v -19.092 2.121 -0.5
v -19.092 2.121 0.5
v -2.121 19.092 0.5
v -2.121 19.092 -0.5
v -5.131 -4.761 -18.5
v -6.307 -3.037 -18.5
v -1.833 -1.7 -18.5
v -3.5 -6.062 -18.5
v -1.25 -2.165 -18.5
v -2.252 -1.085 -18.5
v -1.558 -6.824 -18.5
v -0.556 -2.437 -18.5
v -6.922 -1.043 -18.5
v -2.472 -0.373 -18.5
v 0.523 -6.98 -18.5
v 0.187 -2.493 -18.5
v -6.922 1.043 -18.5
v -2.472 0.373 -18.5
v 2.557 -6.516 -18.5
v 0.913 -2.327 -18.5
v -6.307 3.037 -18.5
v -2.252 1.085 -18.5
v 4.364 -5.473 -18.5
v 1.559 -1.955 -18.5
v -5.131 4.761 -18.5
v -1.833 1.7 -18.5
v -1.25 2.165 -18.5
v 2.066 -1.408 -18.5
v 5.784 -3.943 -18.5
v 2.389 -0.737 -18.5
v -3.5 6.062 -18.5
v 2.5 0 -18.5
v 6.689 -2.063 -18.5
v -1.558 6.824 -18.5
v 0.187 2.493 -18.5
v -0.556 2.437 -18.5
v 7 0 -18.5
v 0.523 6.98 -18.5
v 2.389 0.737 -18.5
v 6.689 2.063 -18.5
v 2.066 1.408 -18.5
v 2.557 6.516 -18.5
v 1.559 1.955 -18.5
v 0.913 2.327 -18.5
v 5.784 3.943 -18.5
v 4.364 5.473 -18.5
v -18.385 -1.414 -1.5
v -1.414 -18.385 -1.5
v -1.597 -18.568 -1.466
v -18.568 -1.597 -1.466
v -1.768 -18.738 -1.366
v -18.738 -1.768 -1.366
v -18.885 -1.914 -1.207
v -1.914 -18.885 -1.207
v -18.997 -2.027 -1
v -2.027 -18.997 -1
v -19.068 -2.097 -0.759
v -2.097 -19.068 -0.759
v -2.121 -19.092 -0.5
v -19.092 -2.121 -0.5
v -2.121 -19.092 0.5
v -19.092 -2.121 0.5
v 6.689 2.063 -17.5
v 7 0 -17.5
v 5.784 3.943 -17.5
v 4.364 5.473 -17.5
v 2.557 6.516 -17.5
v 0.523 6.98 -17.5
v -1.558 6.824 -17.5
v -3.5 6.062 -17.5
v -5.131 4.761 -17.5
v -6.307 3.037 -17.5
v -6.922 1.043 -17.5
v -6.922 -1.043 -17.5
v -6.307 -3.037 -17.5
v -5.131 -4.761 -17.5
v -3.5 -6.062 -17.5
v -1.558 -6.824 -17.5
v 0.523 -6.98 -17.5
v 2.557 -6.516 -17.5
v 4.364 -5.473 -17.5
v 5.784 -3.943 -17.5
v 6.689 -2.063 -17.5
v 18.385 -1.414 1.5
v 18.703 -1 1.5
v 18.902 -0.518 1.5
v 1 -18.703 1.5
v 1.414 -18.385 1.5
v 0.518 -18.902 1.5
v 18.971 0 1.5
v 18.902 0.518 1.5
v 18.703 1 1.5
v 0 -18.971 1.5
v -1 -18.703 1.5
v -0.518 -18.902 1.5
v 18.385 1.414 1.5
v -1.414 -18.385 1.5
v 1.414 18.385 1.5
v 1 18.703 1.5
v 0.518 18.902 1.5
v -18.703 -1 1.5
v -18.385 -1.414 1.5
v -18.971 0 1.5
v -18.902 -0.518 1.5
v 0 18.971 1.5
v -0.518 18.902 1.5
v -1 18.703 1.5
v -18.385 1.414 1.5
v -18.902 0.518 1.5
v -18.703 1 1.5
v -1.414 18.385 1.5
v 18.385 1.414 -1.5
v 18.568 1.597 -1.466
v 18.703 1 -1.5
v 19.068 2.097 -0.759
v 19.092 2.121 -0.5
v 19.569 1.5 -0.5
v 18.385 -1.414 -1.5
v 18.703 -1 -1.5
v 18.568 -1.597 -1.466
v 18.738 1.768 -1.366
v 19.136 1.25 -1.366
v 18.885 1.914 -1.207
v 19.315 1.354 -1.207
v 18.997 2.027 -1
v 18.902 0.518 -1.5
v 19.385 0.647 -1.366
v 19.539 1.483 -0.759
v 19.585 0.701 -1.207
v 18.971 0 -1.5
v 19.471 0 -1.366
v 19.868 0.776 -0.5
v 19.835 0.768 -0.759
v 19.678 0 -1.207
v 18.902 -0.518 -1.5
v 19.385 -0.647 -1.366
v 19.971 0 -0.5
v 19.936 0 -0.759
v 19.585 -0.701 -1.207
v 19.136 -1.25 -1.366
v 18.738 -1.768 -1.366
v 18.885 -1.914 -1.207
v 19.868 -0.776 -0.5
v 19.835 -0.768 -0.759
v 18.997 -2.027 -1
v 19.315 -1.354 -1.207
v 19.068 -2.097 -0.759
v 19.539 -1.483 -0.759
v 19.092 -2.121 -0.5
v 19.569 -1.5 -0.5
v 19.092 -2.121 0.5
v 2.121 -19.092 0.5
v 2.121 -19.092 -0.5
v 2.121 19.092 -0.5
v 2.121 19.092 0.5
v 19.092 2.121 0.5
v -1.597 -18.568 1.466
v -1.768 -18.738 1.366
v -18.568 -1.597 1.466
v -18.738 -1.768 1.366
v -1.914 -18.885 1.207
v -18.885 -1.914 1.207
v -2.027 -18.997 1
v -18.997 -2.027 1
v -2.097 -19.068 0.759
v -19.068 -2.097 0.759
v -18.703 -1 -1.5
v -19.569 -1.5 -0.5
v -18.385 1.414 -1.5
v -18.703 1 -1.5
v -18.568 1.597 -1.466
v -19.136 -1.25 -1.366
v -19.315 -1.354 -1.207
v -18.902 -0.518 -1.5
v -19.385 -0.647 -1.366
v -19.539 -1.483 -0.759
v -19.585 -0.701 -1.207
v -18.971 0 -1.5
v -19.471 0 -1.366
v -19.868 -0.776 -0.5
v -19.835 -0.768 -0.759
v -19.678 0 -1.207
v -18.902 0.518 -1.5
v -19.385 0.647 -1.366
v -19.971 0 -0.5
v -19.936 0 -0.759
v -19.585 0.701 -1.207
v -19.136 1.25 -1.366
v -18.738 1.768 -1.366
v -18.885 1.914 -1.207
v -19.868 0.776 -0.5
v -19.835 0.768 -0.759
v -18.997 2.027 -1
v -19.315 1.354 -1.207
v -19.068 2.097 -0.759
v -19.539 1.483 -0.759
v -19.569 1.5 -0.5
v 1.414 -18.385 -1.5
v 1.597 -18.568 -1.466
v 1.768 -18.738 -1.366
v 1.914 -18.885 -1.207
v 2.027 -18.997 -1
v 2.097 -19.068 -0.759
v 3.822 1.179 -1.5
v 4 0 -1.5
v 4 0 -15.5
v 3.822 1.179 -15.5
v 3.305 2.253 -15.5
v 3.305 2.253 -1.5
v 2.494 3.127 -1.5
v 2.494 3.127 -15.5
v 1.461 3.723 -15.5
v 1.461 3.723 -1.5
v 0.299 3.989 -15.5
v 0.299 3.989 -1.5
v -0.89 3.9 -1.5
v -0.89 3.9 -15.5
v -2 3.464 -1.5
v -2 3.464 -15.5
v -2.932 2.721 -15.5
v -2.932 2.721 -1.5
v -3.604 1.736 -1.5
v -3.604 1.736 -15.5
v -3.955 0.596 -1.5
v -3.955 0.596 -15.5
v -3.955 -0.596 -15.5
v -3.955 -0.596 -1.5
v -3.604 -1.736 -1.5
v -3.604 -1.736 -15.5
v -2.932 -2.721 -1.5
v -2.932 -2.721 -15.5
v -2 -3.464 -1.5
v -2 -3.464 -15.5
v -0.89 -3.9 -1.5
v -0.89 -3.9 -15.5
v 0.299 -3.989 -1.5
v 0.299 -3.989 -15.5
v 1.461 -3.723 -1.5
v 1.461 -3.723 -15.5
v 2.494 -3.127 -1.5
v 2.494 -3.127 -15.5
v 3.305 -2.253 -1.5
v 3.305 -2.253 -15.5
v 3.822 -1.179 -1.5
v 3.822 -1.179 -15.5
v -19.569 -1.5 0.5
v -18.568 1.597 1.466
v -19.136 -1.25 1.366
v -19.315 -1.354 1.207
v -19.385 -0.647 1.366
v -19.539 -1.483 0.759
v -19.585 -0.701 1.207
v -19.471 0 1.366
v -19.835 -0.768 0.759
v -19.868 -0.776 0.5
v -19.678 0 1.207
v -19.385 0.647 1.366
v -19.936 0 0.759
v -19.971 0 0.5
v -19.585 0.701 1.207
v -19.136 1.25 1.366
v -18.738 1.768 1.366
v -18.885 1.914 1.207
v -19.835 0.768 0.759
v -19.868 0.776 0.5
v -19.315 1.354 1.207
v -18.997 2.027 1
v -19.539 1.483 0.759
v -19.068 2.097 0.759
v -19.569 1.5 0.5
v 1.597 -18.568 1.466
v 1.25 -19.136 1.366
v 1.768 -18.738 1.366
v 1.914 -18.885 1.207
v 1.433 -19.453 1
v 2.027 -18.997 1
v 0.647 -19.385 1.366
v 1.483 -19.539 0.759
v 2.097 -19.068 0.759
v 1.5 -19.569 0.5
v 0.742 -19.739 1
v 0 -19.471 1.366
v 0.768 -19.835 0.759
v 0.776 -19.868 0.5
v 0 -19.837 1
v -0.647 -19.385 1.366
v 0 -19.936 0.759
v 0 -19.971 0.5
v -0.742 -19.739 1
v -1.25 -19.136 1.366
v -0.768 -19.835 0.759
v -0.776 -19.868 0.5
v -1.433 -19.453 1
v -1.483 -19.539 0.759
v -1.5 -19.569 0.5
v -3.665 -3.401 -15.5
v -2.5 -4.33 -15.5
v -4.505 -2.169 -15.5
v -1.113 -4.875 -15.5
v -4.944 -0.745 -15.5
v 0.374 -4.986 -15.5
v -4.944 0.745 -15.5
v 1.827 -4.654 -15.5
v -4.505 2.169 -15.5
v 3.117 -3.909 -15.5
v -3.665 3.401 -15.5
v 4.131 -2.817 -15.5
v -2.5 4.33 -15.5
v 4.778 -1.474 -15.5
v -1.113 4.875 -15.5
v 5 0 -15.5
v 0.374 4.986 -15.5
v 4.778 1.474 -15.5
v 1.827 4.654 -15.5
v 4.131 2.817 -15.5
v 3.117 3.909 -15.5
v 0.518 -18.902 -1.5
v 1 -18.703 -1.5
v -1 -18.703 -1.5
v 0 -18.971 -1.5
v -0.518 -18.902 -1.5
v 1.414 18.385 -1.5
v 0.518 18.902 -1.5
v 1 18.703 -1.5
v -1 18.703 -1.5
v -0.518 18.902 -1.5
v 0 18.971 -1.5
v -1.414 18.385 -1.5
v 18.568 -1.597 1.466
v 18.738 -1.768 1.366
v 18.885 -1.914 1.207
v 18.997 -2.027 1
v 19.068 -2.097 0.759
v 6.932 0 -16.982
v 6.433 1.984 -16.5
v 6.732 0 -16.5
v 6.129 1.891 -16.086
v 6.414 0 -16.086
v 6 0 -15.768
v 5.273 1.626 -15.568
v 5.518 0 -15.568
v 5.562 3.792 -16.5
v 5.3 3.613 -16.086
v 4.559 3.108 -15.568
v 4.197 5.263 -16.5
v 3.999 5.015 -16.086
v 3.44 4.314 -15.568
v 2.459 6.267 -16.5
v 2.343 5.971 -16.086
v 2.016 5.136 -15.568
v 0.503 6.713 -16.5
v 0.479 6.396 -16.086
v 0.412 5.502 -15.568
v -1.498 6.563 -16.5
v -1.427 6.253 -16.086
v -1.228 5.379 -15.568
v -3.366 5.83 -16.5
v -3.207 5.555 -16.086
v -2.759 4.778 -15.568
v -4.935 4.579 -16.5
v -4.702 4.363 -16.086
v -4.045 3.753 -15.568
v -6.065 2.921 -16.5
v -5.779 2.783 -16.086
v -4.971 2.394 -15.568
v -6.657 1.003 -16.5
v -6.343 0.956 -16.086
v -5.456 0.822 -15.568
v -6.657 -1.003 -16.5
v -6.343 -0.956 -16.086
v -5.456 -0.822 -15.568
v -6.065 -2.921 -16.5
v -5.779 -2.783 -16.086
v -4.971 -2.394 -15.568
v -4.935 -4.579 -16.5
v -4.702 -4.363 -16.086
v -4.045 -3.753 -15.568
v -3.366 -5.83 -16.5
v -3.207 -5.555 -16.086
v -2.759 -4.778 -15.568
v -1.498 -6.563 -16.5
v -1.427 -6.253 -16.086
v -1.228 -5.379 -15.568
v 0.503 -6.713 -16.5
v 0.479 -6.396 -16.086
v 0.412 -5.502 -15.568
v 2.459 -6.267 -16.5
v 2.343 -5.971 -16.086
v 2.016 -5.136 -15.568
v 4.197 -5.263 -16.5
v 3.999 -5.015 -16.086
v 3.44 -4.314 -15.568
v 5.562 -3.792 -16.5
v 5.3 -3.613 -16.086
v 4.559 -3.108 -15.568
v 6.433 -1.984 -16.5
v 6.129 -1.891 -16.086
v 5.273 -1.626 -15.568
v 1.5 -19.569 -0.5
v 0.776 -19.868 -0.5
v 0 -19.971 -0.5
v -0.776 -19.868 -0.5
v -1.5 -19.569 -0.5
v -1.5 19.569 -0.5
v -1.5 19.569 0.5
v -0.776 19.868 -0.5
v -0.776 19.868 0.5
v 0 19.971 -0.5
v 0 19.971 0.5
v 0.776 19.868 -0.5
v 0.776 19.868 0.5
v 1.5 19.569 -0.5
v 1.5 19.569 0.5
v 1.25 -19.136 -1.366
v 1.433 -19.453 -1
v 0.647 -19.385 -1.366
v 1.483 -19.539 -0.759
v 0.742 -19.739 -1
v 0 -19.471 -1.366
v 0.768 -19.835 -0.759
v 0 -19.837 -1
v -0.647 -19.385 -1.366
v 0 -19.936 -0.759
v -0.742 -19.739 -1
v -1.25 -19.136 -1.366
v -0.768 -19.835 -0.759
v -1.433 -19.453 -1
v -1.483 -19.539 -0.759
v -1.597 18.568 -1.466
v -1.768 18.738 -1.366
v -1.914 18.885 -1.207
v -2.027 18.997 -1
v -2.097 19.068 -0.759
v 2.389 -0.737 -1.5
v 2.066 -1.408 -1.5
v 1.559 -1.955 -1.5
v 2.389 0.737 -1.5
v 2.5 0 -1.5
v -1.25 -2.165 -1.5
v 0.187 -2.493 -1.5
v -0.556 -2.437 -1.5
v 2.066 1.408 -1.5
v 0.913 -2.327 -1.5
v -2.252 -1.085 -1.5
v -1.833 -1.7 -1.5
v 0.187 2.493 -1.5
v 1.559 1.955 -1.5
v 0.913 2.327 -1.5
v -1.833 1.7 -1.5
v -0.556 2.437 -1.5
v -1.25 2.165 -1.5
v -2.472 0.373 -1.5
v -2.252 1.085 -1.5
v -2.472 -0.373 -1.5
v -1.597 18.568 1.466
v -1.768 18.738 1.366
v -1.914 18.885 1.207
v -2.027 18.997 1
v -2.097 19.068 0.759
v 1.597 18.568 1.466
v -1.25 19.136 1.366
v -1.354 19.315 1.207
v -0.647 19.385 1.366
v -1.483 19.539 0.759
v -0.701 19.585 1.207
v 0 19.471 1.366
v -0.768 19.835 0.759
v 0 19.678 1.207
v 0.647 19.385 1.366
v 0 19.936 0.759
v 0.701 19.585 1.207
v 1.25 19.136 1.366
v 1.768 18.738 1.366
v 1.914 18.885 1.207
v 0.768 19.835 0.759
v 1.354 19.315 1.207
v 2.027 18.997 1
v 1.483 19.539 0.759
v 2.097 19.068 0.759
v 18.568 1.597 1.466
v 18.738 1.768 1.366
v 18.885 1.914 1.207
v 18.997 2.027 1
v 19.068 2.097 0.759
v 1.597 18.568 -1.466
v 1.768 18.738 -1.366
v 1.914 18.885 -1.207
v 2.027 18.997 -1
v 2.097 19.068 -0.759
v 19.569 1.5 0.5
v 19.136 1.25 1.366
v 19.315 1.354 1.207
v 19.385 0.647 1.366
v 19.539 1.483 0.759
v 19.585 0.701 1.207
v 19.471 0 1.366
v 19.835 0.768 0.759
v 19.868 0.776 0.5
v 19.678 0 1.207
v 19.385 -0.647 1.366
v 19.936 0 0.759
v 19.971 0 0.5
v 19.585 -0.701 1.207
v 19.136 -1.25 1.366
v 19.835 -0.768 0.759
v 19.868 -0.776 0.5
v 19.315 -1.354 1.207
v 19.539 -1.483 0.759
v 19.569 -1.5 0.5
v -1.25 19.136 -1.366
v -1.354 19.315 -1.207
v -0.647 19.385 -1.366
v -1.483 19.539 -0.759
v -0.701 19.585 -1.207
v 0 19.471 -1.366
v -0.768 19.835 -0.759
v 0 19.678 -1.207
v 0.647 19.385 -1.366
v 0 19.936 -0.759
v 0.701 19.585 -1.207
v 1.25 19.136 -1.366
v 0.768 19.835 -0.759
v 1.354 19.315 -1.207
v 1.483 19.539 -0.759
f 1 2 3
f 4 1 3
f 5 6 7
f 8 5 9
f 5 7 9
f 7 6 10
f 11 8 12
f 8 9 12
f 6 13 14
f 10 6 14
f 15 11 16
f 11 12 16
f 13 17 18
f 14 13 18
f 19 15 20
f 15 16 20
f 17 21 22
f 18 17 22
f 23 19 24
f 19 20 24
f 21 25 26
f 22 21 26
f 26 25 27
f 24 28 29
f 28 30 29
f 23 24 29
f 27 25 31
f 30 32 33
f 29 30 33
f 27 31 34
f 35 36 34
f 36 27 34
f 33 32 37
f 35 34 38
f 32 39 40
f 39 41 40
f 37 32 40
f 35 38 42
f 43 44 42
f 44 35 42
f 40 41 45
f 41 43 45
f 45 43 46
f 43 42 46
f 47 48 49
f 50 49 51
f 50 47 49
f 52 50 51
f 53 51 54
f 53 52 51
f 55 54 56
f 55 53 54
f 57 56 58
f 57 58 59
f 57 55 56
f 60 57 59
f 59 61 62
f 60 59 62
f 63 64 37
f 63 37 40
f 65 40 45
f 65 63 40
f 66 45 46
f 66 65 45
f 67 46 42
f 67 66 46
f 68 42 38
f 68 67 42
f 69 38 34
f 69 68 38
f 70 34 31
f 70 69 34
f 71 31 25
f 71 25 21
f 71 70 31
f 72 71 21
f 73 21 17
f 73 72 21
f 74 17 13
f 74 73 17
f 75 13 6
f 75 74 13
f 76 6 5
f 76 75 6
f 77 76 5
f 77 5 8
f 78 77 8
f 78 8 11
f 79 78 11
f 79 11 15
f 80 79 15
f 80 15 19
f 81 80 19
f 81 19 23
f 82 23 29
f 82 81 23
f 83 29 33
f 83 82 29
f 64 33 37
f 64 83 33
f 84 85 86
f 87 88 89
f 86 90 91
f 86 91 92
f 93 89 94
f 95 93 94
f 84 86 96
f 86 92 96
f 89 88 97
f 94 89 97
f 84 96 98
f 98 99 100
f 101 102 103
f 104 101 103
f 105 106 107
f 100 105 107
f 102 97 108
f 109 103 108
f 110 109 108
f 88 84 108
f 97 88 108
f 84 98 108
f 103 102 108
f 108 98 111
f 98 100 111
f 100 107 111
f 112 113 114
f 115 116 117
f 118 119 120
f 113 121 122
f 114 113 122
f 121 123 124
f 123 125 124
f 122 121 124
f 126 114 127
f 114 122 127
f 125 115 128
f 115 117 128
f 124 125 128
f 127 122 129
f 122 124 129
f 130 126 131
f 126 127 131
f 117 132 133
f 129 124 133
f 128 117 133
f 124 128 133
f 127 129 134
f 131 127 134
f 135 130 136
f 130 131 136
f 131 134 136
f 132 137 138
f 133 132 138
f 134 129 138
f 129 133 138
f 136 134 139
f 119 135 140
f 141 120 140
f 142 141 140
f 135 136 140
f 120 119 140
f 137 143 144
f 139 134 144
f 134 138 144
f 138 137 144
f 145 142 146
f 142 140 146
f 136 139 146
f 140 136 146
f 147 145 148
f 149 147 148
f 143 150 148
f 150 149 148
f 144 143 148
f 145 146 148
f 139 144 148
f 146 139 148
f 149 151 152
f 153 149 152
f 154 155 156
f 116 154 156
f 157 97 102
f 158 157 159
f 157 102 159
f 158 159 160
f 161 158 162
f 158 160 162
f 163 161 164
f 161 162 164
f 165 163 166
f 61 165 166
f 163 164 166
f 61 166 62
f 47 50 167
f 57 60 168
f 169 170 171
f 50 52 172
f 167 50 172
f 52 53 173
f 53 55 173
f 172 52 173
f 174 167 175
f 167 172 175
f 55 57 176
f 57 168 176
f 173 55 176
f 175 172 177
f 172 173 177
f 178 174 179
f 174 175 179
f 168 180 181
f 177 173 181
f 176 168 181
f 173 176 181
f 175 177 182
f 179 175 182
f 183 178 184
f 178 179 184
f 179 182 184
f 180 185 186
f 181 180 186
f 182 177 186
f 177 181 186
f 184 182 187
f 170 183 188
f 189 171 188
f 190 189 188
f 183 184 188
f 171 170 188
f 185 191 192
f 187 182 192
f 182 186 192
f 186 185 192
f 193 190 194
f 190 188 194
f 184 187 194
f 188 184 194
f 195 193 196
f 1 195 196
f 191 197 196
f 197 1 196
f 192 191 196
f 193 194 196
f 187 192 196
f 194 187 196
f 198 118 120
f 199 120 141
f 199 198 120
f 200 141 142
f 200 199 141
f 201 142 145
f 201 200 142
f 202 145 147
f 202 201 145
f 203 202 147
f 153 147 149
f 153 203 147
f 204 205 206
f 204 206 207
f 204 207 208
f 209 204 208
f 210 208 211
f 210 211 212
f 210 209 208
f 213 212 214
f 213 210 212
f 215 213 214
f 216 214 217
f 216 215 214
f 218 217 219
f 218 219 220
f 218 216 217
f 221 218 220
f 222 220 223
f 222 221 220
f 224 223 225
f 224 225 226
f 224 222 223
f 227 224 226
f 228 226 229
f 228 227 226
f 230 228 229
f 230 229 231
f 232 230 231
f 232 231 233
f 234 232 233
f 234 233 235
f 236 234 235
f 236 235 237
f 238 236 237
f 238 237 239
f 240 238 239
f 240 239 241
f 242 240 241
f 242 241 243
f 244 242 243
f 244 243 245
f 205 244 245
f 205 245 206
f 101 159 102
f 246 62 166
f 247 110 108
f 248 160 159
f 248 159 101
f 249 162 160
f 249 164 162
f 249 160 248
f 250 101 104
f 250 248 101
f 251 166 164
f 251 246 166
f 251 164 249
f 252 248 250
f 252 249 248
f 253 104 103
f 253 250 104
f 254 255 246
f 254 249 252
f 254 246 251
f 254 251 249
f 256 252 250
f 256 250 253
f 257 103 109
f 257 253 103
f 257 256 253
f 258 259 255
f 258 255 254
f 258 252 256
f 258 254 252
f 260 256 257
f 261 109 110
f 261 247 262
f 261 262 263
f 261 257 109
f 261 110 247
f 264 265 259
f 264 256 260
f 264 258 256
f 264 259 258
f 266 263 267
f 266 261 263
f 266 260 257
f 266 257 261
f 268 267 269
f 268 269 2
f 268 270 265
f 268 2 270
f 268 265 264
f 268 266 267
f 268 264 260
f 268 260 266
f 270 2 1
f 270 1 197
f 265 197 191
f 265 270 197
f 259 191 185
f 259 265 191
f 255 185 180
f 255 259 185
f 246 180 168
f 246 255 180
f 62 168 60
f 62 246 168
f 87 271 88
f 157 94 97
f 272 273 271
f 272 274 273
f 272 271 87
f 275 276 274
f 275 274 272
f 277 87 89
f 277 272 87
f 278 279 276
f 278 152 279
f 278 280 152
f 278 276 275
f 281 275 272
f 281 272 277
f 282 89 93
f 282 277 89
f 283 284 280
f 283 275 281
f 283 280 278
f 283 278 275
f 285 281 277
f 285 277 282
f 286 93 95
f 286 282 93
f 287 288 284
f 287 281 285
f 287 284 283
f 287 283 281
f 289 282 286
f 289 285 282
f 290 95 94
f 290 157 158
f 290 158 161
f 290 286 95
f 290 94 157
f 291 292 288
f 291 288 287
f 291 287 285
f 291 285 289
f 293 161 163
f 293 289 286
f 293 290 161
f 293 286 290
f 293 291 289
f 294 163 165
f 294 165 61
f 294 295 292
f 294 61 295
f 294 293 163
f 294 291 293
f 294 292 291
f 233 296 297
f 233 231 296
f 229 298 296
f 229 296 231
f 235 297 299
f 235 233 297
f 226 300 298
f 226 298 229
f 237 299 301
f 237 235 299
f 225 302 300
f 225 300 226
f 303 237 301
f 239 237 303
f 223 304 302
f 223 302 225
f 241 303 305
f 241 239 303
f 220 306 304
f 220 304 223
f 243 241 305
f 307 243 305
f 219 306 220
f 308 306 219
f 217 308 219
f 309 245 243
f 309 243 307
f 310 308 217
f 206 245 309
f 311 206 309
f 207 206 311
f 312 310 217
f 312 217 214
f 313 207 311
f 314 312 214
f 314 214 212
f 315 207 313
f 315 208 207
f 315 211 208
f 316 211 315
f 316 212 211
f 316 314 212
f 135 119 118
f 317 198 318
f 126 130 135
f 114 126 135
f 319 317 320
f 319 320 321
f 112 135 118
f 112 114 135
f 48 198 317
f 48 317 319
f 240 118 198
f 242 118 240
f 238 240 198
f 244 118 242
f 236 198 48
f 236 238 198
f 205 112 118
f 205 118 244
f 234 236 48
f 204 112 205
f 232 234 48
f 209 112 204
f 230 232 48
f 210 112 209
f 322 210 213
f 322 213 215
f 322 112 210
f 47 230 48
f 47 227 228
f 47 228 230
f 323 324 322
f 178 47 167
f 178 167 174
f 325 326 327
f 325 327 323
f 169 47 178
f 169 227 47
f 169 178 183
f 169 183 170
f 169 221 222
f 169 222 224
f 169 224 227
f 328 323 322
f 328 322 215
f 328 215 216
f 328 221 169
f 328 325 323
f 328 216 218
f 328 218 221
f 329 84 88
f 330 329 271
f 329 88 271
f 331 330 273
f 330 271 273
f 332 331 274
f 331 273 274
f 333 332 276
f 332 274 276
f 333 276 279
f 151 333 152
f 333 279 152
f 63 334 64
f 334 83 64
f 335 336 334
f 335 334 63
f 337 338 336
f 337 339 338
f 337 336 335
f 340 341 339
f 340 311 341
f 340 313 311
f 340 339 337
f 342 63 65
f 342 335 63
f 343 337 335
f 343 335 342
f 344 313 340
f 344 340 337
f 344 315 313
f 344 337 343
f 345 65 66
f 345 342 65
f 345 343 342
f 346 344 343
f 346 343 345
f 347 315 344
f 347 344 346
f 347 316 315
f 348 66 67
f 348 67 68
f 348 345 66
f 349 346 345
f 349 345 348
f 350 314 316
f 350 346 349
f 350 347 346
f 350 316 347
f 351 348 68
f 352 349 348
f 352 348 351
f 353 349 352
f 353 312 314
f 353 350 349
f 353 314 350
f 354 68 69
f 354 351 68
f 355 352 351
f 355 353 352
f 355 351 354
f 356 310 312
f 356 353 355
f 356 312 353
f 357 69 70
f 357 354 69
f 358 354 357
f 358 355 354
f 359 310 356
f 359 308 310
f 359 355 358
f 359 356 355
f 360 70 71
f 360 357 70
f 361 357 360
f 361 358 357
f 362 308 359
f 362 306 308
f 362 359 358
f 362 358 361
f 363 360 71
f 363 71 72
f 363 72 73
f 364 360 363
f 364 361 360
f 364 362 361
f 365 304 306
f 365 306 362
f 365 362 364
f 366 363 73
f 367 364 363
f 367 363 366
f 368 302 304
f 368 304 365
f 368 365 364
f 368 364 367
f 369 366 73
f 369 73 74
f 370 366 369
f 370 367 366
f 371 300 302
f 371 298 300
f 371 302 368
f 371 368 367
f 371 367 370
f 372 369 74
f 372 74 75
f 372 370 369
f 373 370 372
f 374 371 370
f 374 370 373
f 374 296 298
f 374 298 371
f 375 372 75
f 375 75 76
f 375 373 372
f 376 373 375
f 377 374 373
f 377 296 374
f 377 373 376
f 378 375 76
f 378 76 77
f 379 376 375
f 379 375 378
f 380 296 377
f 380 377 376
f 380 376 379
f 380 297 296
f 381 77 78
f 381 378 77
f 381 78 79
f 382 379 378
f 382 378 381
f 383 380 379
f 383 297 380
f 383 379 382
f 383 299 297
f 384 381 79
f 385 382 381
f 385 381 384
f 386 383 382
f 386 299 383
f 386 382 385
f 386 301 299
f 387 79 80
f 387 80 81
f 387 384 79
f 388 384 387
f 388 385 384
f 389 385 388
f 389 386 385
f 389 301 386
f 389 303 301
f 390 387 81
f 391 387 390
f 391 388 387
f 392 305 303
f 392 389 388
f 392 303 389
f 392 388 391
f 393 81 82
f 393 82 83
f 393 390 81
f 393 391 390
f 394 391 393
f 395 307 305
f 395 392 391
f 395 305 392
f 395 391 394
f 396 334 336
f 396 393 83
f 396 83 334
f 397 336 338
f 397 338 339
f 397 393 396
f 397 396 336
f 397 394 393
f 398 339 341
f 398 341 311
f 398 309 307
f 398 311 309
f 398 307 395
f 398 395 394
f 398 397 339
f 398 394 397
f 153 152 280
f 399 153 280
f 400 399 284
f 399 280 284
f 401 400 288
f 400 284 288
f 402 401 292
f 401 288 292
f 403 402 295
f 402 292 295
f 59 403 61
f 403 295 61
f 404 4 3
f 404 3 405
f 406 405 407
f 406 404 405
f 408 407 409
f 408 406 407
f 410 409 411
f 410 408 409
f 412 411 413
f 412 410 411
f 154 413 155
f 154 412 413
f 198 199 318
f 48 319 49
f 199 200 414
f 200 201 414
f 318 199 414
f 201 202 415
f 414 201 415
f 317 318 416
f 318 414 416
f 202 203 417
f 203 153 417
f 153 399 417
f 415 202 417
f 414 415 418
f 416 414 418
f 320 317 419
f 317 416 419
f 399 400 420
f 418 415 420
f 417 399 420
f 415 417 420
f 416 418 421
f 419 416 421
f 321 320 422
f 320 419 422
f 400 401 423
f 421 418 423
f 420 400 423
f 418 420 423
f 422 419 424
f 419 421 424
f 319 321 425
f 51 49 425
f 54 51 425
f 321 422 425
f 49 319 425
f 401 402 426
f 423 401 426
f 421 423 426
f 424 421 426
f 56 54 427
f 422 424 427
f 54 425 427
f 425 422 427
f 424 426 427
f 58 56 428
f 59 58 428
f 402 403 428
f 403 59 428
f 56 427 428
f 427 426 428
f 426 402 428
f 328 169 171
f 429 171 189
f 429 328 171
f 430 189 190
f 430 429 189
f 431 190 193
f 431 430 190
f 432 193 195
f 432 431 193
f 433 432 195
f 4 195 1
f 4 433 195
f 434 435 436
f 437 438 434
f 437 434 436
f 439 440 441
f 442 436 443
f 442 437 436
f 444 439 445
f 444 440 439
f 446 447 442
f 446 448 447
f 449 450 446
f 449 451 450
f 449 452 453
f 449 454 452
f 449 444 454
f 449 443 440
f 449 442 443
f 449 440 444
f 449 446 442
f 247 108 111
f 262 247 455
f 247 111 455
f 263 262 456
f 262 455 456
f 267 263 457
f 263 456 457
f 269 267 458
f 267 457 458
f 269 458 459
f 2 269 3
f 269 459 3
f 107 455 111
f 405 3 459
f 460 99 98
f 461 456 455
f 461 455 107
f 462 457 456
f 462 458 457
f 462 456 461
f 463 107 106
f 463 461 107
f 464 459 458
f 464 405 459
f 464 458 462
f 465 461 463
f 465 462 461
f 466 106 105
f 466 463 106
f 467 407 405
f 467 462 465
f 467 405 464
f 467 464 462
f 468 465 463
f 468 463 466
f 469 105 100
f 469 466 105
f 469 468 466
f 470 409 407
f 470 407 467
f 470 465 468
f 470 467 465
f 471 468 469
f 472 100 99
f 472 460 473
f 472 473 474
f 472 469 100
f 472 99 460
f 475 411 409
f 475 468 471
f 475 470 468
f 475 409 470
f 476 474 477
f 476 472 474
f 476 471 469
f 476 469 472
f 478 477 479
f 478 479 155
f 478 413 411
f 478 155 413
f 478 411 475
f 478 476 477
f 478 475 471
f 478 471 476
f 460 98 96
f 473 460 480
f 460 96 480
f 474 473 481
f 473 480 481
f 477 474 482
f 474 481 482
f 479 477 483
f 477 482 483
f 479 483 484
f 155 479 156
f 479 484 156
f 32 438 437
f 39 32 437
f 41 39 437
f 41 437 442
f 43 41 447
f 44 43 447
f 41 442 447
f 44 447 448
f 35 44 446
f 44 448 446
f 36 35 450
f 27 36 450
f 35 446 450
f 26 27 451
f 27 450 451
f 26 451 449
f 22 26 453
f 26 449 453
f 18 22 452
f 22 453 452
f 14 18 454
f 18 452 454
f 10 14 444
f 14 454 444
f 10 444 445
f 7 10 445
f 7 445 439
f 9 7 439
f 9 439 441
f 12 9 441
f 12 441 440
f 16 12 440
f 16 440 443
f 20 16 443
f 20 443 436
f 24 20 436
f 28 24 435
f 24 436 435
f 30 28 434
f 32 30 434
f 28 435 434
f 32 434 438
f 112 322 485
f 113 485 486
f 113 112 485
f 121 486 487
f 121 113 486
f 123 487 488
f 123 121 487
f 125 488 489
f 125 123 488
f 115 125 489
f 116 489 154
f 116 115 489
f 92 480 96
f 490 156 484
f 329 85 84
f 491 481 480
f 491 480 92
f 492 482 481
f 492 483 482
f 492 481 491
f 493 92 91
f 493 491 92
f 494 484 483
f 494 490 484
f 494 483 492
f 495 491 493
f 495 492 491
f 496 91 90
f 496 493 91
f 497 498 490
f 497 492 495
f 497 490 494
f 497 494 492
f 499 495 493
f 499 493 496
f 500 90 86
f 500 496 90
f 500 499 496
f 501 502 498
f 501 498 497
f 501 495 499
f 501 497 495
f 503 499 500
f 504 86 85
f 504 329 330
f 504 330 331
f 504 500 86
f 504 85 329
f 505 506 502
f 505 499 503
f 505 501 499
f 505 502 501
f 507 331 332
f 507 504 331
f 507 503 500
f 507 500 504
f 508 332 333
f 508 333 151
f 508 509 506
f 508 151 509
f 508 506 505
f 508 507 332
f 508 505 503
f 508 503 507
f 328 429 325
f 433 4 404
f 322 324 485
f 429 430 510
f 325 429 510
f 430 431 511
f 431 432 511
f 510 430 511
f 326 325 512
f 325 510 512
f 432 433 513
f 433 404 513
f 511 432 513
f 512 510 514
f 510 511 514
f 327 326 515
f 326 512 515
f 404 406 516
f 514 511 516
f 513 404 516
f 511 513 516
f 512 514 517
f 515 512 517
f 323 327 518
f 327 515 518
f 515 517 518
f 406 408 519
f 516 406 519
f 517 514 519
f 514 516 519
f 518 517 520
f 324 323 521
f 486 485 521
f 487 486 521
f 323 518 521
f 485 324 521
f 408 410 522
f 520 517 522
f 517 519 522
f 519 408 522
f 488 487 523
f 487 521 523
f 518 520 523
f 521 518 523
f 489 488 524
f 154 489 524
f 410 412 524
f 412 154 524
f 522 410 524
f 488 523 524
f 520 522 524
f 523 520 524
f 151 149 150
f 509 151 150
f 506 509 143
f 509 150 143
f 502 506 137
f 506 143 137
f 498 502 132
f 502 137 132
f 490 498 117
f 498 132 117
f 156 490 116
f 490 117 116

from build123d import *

# Parameters (mm, degrees)
BOSS_EXTRUDE1_DEPTH = 1.5
FILLET1_R           = 3
FILLET3_R           = 1
BOSS_EXTRUDE2_START = -1.5
SKETCH1_3_R         = 4
SKETCH1_3_R_2       = 2.5
BOSS_EXTRUDE2_DEPTH = 17
BOSS_EXTRUDE3_START = -15.5
SKETCH1_4_R         = 7
SKETCH1_4_R_2       = 4
BOSS_EXTRUDE3_DEPTH = 3
FILLET4_R           = 2


with BuildPart() as part:
    # Sketch1 → Boss-Extrude1 (new, symmetric)
    with BuildSketch(Plane.XY):
        Polygon((-21.213203436, 0), (0, 21.213203436), (21.213203436, 0), (0, -21.213203436), align=None)
    extrude(amount=BOSS_EXTRUDE1_DEPTH, both=True)

    # Fillet1
    fillet1_edges = [part.edges().sort_by_distance(p)[0] for p in [
        (-21.213203436, 0, 0),
        (0, 21.213203436, 0),
        (21.213203436, 0, 0),
        (0, -21.213203436, 0),
    ]]
    fillet(fillet1_edges, radius=FILLET1_R)

    # Fillet3
    fillet3_edges = [part.edges().sort_by_distance(p)[0] for p in [
        (-10.606601718, -10.606601718, -1.5),
        (-10.606601718, -10.606601718, 1.5),
        (-10.606601718, 10.606601718, -1.5),
        (10.606601718, 10.606601718, -1.5),
        (10.606601718, -10.606601718, -1.5),
        (0, 19.970562748, -1.5),
        (0, -19.970562748, -1.5),
        (19.970562748, 0, -1.5),
        (-19.970562748, 0, -1.5),
        (-10.606601718, 10.606601718, 1.5),
        (10.606601718, -10.606601718, 1.5),
        (10.606601718, 10.606601718, 1.5),
        (0, 19.970562748, 1.5),
        (0, -19.970562748, 1.5),
        (19.970562748, 0, 1.5),
        (-19.970562748, 0, 1.5),
    ]]
    fillet(fillet3_edges, radius=FILLET3_R)

    # Sketch1<3> → Boss-Extrude2 (add)
    with BuildSketch(Plane.XY.offset(BOSS_EXTRUDE2_START)):
        Circle(SKETCH1_3_R)
        Circle(SKETCH1_3_R_2, mode=Mode.SUBTRACT)
    extrude(amount=-BOSS_EXTRUDE2_DEPTH)

    # Sketch1<4> → Boss-Extrude3 (add)
    with BuildSketch(Plane.XY.offset(BOSS_EXTRUDE3_START)):
        Circle(SKETCH1_4_R)
        Circle(SKETCH1_4_R_2, mode=Mode.SUBTRACT)
    extrude(amount=-BOSS_EXTRUDE3_DEPTH)

    # Fillet4
    fillet4_edges = [part.edges().sort_by_distance(p)[0] for p in [
        (-7, 0, -15.5),
    ]]
    fillet(fillet4_edges, radius=FILLET4_R)


solid = part.part
